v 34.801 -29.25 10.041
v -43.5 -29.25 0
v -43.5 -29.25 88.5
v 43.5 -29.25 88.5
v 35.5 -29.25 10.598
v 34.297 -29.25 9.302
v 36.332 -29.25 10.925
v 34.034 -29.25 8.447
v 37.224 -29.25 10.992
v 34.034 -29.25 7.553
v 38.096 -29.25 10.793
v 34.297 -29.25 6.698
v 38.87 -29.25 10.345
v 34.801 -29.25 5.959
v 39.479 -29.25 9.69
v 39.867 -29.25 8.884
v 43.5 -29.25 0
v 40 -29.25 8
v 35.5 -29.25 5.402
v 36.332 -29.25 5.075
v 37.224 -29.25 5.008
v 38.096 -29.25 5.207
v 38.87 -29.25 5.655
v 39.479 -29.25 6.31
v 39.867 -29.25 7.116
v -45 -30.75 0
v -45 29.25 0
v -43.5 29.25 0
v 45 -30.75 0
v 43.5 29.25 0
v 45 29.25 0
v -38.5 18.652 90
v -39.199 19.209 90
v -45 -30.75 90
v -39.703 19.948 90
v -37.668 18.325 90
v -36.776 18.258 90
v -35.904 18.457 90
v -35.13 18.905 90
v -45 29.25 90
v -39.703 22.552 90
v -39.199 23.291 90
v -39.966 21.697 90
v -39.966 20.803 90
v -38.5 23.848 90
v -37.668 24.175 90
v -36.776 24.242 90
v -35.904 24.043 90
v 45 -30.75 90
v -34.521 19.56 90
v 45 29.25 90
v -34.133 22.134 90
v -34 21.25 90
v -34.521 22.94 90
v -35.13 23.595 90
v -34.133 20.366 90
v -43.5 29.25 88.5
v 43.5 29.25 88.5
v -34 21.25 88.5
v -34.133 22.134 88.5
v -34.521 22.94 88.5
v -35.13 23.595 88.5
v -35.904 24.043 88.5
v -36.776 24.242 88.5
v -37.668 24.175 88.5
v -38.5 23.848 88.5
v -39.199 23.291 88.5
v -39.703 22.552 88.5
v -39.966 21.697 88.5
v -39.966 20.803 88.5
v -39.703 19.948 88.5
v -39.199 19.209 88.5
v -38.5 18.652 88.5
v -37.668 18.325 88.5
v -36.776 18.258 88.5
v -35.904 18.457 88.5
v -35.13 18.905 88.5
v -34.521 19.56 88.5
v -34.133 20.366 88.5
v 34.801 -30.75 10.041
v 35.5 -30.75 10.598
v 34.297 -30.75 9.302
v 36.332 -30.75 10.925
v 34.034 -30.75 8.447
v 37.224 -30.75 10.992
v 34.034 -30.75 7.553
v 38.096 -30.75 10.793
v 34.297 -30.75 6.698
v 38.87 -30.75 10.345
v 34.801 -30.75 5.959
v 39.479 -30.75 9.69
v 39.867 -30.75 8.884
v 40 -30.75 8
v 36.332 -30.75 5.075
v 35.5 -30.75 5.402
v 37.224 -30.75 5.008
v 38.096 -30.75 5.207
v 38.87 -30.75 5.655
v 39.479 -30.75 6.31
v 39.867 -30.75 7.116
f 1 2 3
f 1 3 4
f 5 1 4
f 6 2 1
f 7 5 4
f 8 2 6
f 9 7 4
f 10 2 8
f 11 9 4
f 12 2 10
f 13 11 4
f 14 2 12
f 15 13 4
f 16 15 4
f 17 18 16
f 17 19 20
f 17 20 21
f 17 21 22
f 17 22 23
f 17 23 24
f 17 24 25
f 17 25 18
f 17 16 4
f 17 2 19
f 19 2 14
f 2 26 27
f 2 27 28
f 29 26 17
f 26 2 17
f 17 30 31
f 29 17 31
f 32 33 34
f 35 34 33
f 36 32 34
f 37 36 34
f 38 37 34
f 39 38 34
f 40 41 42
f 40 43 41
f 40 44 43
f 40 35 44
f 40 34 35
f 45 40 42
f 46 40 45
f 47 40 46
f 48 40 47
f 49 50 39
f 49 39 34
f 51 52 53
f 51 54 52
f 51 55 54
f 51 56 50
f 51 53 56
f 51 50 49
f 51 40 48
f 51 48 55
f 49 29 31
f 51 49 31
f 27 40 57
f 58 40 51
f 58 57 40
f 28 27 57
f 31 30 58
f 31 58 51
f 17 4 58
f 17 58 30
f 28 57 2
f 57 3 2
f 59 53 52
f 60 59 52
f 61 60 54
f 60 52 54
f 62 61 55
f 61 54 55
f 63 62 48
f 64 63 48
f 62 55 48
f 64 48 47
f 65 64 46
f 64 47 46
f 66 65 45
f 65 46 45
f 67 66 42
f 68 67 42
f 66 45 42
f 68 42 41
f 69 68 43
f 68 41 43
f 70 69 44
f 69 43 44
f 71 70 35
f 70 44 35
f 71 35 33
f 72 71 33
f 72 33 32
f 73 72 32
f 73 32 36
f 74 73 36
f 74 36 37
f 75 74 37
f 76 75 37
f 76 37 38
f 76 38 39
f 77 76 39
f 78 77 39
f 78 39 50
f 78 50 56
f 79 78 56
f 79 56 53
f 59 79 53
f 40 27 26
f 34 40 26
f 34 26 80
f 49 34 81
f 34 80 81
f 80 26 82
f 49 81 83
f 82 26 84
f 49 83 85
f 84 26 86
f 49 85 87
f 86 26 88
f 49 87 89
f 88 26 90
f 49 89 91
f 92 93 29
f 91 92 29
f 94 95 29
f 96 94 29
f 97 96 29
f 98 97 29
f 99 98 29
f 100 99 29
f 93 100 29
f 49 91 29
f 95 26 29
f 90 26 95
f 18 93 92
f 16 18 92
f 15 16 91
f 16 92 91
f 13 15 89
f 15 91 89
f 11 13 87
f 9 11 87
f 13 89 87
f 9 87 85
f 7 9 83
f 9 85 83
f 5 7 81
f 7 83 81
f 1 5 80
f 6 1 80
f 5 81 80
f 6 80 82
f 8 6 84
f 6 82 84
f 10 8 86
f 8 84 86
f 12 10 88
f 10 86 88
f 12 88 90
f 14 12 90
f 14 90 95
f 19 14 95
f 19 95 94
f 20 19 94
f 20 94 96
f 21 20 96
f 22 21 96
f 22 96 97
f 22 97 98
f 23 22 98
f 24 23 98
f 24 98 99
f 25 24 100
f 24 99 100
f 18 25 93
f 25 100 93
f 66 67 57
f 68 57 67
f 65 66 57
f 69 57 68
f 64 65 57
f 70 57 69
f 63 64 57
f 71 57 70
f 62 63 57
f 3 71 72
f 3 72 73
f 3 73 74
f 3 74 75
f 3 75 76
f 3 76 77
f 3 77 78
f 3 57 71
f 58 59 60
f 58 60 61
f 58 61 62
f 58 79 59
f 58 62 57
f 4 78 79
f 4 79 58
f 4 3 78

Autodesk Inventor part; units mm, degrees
ref_plane "Work Plane1" through (0.1672, 0, 0) normal (0, 0, 1) x (1, 0, 0)
sketch "Sketch1" plane through (0.1672, 0, 0) normal (0, 0, 1) x (1, 0, 0)
  line L0 (-45.1672, 29.25) -> (44.8328, 29.25) projected
  line L1 (-45.1672, 29.25) -> (-45.1672, -30.75) projected
  line L2 (-45.1672, -30.75) -> (44.8328, -30.75) projected
  line L3 (44.8328, -30.75) -> (44.8328, 29.25) projected
  circle A0 centre (-37.1672, -22.75) radius 3 projected
  line L4 (44.8328, -30.75) -> (-45.1672, -30.75)
  line L5 (-45.1672, -30.75) -> (-45.1672, -29.25)
  line L6 (-45.1672, -29.25) -> (44.8328, -29.25)
  line L7 (44.8328, -29.25) -> (44.8328, -30.75)
  point P0 (-0.1672, 0)
  dimension "d0" = 1.5
ref_plane "Work Plane2" through (-45.2602, 13.6363, 90) normal (0, 0, 1) x (1, 0, 0)
extrude "Extrusion1" add sketch "Sketch1" along normal up to surface (90 mm away) contours L6 L3 L2 L1
sketch "Sketch2" plane through (-45, -29.25, 0) normal (0, 1, 0) x (1, 0, 0)
  line L0 (90, 0) -> (90, -90) projected
  line L1 (0, 0) -> (0, -90) projected
  line L2 (90, -90) -> (0, -90)
  line L3 (0, -90) -> (0, -88.5)
  line L4 (0, -88.5) -> (90, -88.5)
  line L5 (90, -88.5) -> (90, -90)
  point P0 (45, 0)
  dimension "d3" = 1.5
ref_plane "Work Plane3" through (-81.5561, 29.25, -36.5561) normal (0, -1, 0) x (1, 0, 0)
extrude "Extrusion2" add sketch "Sketch2" along normal up to surface (58.5 mm away)
sketch "Sketch4" plane through (-45, -29.25, 0) normal (0, 1, 0) x (1, 0, 0)
  line L0 (90, 0) -> (90, -88.5) projected
  line L1 (90, 0) -> (0, 0) projected
  line L2 (90, -88.5) -> (88.5, -88.5)
  line L3 (88.5, -88.5) -> (88.5, 0)
  line L4 (88.5, 0) -> (90, 0)
  line L5 (90, 0) -> (90, -88.5)
  line L6 (0, 0) -> (0, -88.5) projected
  line L7 (0, -88.5) -> (1.5, -88.5)
  line L8 (1.5, -88.5) -> (1.5, 0)
  line L9 (1.5, 0) -> (0, 0)
  line L10 (0, 0) -> (0, -88.5)
  point P0 (45, 0)
  dimension "d7" = 1.5
  dimension "d8" = 1.5
ref_plane "Work Plane4" through (-81.5561, 29.25, -36.5561) normal (0, -1, 0) x (1, 0, 0)
extrude "Extrusion3" add sketch "Sketch4" along normal up to surface (58.5 mm away)
sketch "Sketch5" plane through (-45, -30.75, 0) normal (0, -1, 0) x (1, 0, 0)
  circle A0 centre (82, 8) radius 3 projected
  point P0 (45, 0)
extrude "Extrusion4" cut sketch "Sketch5" against normal up to next
sketch "Sketch6" plane through (-45, -30.75, 90) normal (0, 0, 1) x (1, 0, 0)
  circle A0 centre (8, 52) radius 3 projected
  point P0 (45, 30.75)
extrude "Extrusion5" cut sketch "Sketch6" against normal up to next
properties part number "fixação chave geral"
